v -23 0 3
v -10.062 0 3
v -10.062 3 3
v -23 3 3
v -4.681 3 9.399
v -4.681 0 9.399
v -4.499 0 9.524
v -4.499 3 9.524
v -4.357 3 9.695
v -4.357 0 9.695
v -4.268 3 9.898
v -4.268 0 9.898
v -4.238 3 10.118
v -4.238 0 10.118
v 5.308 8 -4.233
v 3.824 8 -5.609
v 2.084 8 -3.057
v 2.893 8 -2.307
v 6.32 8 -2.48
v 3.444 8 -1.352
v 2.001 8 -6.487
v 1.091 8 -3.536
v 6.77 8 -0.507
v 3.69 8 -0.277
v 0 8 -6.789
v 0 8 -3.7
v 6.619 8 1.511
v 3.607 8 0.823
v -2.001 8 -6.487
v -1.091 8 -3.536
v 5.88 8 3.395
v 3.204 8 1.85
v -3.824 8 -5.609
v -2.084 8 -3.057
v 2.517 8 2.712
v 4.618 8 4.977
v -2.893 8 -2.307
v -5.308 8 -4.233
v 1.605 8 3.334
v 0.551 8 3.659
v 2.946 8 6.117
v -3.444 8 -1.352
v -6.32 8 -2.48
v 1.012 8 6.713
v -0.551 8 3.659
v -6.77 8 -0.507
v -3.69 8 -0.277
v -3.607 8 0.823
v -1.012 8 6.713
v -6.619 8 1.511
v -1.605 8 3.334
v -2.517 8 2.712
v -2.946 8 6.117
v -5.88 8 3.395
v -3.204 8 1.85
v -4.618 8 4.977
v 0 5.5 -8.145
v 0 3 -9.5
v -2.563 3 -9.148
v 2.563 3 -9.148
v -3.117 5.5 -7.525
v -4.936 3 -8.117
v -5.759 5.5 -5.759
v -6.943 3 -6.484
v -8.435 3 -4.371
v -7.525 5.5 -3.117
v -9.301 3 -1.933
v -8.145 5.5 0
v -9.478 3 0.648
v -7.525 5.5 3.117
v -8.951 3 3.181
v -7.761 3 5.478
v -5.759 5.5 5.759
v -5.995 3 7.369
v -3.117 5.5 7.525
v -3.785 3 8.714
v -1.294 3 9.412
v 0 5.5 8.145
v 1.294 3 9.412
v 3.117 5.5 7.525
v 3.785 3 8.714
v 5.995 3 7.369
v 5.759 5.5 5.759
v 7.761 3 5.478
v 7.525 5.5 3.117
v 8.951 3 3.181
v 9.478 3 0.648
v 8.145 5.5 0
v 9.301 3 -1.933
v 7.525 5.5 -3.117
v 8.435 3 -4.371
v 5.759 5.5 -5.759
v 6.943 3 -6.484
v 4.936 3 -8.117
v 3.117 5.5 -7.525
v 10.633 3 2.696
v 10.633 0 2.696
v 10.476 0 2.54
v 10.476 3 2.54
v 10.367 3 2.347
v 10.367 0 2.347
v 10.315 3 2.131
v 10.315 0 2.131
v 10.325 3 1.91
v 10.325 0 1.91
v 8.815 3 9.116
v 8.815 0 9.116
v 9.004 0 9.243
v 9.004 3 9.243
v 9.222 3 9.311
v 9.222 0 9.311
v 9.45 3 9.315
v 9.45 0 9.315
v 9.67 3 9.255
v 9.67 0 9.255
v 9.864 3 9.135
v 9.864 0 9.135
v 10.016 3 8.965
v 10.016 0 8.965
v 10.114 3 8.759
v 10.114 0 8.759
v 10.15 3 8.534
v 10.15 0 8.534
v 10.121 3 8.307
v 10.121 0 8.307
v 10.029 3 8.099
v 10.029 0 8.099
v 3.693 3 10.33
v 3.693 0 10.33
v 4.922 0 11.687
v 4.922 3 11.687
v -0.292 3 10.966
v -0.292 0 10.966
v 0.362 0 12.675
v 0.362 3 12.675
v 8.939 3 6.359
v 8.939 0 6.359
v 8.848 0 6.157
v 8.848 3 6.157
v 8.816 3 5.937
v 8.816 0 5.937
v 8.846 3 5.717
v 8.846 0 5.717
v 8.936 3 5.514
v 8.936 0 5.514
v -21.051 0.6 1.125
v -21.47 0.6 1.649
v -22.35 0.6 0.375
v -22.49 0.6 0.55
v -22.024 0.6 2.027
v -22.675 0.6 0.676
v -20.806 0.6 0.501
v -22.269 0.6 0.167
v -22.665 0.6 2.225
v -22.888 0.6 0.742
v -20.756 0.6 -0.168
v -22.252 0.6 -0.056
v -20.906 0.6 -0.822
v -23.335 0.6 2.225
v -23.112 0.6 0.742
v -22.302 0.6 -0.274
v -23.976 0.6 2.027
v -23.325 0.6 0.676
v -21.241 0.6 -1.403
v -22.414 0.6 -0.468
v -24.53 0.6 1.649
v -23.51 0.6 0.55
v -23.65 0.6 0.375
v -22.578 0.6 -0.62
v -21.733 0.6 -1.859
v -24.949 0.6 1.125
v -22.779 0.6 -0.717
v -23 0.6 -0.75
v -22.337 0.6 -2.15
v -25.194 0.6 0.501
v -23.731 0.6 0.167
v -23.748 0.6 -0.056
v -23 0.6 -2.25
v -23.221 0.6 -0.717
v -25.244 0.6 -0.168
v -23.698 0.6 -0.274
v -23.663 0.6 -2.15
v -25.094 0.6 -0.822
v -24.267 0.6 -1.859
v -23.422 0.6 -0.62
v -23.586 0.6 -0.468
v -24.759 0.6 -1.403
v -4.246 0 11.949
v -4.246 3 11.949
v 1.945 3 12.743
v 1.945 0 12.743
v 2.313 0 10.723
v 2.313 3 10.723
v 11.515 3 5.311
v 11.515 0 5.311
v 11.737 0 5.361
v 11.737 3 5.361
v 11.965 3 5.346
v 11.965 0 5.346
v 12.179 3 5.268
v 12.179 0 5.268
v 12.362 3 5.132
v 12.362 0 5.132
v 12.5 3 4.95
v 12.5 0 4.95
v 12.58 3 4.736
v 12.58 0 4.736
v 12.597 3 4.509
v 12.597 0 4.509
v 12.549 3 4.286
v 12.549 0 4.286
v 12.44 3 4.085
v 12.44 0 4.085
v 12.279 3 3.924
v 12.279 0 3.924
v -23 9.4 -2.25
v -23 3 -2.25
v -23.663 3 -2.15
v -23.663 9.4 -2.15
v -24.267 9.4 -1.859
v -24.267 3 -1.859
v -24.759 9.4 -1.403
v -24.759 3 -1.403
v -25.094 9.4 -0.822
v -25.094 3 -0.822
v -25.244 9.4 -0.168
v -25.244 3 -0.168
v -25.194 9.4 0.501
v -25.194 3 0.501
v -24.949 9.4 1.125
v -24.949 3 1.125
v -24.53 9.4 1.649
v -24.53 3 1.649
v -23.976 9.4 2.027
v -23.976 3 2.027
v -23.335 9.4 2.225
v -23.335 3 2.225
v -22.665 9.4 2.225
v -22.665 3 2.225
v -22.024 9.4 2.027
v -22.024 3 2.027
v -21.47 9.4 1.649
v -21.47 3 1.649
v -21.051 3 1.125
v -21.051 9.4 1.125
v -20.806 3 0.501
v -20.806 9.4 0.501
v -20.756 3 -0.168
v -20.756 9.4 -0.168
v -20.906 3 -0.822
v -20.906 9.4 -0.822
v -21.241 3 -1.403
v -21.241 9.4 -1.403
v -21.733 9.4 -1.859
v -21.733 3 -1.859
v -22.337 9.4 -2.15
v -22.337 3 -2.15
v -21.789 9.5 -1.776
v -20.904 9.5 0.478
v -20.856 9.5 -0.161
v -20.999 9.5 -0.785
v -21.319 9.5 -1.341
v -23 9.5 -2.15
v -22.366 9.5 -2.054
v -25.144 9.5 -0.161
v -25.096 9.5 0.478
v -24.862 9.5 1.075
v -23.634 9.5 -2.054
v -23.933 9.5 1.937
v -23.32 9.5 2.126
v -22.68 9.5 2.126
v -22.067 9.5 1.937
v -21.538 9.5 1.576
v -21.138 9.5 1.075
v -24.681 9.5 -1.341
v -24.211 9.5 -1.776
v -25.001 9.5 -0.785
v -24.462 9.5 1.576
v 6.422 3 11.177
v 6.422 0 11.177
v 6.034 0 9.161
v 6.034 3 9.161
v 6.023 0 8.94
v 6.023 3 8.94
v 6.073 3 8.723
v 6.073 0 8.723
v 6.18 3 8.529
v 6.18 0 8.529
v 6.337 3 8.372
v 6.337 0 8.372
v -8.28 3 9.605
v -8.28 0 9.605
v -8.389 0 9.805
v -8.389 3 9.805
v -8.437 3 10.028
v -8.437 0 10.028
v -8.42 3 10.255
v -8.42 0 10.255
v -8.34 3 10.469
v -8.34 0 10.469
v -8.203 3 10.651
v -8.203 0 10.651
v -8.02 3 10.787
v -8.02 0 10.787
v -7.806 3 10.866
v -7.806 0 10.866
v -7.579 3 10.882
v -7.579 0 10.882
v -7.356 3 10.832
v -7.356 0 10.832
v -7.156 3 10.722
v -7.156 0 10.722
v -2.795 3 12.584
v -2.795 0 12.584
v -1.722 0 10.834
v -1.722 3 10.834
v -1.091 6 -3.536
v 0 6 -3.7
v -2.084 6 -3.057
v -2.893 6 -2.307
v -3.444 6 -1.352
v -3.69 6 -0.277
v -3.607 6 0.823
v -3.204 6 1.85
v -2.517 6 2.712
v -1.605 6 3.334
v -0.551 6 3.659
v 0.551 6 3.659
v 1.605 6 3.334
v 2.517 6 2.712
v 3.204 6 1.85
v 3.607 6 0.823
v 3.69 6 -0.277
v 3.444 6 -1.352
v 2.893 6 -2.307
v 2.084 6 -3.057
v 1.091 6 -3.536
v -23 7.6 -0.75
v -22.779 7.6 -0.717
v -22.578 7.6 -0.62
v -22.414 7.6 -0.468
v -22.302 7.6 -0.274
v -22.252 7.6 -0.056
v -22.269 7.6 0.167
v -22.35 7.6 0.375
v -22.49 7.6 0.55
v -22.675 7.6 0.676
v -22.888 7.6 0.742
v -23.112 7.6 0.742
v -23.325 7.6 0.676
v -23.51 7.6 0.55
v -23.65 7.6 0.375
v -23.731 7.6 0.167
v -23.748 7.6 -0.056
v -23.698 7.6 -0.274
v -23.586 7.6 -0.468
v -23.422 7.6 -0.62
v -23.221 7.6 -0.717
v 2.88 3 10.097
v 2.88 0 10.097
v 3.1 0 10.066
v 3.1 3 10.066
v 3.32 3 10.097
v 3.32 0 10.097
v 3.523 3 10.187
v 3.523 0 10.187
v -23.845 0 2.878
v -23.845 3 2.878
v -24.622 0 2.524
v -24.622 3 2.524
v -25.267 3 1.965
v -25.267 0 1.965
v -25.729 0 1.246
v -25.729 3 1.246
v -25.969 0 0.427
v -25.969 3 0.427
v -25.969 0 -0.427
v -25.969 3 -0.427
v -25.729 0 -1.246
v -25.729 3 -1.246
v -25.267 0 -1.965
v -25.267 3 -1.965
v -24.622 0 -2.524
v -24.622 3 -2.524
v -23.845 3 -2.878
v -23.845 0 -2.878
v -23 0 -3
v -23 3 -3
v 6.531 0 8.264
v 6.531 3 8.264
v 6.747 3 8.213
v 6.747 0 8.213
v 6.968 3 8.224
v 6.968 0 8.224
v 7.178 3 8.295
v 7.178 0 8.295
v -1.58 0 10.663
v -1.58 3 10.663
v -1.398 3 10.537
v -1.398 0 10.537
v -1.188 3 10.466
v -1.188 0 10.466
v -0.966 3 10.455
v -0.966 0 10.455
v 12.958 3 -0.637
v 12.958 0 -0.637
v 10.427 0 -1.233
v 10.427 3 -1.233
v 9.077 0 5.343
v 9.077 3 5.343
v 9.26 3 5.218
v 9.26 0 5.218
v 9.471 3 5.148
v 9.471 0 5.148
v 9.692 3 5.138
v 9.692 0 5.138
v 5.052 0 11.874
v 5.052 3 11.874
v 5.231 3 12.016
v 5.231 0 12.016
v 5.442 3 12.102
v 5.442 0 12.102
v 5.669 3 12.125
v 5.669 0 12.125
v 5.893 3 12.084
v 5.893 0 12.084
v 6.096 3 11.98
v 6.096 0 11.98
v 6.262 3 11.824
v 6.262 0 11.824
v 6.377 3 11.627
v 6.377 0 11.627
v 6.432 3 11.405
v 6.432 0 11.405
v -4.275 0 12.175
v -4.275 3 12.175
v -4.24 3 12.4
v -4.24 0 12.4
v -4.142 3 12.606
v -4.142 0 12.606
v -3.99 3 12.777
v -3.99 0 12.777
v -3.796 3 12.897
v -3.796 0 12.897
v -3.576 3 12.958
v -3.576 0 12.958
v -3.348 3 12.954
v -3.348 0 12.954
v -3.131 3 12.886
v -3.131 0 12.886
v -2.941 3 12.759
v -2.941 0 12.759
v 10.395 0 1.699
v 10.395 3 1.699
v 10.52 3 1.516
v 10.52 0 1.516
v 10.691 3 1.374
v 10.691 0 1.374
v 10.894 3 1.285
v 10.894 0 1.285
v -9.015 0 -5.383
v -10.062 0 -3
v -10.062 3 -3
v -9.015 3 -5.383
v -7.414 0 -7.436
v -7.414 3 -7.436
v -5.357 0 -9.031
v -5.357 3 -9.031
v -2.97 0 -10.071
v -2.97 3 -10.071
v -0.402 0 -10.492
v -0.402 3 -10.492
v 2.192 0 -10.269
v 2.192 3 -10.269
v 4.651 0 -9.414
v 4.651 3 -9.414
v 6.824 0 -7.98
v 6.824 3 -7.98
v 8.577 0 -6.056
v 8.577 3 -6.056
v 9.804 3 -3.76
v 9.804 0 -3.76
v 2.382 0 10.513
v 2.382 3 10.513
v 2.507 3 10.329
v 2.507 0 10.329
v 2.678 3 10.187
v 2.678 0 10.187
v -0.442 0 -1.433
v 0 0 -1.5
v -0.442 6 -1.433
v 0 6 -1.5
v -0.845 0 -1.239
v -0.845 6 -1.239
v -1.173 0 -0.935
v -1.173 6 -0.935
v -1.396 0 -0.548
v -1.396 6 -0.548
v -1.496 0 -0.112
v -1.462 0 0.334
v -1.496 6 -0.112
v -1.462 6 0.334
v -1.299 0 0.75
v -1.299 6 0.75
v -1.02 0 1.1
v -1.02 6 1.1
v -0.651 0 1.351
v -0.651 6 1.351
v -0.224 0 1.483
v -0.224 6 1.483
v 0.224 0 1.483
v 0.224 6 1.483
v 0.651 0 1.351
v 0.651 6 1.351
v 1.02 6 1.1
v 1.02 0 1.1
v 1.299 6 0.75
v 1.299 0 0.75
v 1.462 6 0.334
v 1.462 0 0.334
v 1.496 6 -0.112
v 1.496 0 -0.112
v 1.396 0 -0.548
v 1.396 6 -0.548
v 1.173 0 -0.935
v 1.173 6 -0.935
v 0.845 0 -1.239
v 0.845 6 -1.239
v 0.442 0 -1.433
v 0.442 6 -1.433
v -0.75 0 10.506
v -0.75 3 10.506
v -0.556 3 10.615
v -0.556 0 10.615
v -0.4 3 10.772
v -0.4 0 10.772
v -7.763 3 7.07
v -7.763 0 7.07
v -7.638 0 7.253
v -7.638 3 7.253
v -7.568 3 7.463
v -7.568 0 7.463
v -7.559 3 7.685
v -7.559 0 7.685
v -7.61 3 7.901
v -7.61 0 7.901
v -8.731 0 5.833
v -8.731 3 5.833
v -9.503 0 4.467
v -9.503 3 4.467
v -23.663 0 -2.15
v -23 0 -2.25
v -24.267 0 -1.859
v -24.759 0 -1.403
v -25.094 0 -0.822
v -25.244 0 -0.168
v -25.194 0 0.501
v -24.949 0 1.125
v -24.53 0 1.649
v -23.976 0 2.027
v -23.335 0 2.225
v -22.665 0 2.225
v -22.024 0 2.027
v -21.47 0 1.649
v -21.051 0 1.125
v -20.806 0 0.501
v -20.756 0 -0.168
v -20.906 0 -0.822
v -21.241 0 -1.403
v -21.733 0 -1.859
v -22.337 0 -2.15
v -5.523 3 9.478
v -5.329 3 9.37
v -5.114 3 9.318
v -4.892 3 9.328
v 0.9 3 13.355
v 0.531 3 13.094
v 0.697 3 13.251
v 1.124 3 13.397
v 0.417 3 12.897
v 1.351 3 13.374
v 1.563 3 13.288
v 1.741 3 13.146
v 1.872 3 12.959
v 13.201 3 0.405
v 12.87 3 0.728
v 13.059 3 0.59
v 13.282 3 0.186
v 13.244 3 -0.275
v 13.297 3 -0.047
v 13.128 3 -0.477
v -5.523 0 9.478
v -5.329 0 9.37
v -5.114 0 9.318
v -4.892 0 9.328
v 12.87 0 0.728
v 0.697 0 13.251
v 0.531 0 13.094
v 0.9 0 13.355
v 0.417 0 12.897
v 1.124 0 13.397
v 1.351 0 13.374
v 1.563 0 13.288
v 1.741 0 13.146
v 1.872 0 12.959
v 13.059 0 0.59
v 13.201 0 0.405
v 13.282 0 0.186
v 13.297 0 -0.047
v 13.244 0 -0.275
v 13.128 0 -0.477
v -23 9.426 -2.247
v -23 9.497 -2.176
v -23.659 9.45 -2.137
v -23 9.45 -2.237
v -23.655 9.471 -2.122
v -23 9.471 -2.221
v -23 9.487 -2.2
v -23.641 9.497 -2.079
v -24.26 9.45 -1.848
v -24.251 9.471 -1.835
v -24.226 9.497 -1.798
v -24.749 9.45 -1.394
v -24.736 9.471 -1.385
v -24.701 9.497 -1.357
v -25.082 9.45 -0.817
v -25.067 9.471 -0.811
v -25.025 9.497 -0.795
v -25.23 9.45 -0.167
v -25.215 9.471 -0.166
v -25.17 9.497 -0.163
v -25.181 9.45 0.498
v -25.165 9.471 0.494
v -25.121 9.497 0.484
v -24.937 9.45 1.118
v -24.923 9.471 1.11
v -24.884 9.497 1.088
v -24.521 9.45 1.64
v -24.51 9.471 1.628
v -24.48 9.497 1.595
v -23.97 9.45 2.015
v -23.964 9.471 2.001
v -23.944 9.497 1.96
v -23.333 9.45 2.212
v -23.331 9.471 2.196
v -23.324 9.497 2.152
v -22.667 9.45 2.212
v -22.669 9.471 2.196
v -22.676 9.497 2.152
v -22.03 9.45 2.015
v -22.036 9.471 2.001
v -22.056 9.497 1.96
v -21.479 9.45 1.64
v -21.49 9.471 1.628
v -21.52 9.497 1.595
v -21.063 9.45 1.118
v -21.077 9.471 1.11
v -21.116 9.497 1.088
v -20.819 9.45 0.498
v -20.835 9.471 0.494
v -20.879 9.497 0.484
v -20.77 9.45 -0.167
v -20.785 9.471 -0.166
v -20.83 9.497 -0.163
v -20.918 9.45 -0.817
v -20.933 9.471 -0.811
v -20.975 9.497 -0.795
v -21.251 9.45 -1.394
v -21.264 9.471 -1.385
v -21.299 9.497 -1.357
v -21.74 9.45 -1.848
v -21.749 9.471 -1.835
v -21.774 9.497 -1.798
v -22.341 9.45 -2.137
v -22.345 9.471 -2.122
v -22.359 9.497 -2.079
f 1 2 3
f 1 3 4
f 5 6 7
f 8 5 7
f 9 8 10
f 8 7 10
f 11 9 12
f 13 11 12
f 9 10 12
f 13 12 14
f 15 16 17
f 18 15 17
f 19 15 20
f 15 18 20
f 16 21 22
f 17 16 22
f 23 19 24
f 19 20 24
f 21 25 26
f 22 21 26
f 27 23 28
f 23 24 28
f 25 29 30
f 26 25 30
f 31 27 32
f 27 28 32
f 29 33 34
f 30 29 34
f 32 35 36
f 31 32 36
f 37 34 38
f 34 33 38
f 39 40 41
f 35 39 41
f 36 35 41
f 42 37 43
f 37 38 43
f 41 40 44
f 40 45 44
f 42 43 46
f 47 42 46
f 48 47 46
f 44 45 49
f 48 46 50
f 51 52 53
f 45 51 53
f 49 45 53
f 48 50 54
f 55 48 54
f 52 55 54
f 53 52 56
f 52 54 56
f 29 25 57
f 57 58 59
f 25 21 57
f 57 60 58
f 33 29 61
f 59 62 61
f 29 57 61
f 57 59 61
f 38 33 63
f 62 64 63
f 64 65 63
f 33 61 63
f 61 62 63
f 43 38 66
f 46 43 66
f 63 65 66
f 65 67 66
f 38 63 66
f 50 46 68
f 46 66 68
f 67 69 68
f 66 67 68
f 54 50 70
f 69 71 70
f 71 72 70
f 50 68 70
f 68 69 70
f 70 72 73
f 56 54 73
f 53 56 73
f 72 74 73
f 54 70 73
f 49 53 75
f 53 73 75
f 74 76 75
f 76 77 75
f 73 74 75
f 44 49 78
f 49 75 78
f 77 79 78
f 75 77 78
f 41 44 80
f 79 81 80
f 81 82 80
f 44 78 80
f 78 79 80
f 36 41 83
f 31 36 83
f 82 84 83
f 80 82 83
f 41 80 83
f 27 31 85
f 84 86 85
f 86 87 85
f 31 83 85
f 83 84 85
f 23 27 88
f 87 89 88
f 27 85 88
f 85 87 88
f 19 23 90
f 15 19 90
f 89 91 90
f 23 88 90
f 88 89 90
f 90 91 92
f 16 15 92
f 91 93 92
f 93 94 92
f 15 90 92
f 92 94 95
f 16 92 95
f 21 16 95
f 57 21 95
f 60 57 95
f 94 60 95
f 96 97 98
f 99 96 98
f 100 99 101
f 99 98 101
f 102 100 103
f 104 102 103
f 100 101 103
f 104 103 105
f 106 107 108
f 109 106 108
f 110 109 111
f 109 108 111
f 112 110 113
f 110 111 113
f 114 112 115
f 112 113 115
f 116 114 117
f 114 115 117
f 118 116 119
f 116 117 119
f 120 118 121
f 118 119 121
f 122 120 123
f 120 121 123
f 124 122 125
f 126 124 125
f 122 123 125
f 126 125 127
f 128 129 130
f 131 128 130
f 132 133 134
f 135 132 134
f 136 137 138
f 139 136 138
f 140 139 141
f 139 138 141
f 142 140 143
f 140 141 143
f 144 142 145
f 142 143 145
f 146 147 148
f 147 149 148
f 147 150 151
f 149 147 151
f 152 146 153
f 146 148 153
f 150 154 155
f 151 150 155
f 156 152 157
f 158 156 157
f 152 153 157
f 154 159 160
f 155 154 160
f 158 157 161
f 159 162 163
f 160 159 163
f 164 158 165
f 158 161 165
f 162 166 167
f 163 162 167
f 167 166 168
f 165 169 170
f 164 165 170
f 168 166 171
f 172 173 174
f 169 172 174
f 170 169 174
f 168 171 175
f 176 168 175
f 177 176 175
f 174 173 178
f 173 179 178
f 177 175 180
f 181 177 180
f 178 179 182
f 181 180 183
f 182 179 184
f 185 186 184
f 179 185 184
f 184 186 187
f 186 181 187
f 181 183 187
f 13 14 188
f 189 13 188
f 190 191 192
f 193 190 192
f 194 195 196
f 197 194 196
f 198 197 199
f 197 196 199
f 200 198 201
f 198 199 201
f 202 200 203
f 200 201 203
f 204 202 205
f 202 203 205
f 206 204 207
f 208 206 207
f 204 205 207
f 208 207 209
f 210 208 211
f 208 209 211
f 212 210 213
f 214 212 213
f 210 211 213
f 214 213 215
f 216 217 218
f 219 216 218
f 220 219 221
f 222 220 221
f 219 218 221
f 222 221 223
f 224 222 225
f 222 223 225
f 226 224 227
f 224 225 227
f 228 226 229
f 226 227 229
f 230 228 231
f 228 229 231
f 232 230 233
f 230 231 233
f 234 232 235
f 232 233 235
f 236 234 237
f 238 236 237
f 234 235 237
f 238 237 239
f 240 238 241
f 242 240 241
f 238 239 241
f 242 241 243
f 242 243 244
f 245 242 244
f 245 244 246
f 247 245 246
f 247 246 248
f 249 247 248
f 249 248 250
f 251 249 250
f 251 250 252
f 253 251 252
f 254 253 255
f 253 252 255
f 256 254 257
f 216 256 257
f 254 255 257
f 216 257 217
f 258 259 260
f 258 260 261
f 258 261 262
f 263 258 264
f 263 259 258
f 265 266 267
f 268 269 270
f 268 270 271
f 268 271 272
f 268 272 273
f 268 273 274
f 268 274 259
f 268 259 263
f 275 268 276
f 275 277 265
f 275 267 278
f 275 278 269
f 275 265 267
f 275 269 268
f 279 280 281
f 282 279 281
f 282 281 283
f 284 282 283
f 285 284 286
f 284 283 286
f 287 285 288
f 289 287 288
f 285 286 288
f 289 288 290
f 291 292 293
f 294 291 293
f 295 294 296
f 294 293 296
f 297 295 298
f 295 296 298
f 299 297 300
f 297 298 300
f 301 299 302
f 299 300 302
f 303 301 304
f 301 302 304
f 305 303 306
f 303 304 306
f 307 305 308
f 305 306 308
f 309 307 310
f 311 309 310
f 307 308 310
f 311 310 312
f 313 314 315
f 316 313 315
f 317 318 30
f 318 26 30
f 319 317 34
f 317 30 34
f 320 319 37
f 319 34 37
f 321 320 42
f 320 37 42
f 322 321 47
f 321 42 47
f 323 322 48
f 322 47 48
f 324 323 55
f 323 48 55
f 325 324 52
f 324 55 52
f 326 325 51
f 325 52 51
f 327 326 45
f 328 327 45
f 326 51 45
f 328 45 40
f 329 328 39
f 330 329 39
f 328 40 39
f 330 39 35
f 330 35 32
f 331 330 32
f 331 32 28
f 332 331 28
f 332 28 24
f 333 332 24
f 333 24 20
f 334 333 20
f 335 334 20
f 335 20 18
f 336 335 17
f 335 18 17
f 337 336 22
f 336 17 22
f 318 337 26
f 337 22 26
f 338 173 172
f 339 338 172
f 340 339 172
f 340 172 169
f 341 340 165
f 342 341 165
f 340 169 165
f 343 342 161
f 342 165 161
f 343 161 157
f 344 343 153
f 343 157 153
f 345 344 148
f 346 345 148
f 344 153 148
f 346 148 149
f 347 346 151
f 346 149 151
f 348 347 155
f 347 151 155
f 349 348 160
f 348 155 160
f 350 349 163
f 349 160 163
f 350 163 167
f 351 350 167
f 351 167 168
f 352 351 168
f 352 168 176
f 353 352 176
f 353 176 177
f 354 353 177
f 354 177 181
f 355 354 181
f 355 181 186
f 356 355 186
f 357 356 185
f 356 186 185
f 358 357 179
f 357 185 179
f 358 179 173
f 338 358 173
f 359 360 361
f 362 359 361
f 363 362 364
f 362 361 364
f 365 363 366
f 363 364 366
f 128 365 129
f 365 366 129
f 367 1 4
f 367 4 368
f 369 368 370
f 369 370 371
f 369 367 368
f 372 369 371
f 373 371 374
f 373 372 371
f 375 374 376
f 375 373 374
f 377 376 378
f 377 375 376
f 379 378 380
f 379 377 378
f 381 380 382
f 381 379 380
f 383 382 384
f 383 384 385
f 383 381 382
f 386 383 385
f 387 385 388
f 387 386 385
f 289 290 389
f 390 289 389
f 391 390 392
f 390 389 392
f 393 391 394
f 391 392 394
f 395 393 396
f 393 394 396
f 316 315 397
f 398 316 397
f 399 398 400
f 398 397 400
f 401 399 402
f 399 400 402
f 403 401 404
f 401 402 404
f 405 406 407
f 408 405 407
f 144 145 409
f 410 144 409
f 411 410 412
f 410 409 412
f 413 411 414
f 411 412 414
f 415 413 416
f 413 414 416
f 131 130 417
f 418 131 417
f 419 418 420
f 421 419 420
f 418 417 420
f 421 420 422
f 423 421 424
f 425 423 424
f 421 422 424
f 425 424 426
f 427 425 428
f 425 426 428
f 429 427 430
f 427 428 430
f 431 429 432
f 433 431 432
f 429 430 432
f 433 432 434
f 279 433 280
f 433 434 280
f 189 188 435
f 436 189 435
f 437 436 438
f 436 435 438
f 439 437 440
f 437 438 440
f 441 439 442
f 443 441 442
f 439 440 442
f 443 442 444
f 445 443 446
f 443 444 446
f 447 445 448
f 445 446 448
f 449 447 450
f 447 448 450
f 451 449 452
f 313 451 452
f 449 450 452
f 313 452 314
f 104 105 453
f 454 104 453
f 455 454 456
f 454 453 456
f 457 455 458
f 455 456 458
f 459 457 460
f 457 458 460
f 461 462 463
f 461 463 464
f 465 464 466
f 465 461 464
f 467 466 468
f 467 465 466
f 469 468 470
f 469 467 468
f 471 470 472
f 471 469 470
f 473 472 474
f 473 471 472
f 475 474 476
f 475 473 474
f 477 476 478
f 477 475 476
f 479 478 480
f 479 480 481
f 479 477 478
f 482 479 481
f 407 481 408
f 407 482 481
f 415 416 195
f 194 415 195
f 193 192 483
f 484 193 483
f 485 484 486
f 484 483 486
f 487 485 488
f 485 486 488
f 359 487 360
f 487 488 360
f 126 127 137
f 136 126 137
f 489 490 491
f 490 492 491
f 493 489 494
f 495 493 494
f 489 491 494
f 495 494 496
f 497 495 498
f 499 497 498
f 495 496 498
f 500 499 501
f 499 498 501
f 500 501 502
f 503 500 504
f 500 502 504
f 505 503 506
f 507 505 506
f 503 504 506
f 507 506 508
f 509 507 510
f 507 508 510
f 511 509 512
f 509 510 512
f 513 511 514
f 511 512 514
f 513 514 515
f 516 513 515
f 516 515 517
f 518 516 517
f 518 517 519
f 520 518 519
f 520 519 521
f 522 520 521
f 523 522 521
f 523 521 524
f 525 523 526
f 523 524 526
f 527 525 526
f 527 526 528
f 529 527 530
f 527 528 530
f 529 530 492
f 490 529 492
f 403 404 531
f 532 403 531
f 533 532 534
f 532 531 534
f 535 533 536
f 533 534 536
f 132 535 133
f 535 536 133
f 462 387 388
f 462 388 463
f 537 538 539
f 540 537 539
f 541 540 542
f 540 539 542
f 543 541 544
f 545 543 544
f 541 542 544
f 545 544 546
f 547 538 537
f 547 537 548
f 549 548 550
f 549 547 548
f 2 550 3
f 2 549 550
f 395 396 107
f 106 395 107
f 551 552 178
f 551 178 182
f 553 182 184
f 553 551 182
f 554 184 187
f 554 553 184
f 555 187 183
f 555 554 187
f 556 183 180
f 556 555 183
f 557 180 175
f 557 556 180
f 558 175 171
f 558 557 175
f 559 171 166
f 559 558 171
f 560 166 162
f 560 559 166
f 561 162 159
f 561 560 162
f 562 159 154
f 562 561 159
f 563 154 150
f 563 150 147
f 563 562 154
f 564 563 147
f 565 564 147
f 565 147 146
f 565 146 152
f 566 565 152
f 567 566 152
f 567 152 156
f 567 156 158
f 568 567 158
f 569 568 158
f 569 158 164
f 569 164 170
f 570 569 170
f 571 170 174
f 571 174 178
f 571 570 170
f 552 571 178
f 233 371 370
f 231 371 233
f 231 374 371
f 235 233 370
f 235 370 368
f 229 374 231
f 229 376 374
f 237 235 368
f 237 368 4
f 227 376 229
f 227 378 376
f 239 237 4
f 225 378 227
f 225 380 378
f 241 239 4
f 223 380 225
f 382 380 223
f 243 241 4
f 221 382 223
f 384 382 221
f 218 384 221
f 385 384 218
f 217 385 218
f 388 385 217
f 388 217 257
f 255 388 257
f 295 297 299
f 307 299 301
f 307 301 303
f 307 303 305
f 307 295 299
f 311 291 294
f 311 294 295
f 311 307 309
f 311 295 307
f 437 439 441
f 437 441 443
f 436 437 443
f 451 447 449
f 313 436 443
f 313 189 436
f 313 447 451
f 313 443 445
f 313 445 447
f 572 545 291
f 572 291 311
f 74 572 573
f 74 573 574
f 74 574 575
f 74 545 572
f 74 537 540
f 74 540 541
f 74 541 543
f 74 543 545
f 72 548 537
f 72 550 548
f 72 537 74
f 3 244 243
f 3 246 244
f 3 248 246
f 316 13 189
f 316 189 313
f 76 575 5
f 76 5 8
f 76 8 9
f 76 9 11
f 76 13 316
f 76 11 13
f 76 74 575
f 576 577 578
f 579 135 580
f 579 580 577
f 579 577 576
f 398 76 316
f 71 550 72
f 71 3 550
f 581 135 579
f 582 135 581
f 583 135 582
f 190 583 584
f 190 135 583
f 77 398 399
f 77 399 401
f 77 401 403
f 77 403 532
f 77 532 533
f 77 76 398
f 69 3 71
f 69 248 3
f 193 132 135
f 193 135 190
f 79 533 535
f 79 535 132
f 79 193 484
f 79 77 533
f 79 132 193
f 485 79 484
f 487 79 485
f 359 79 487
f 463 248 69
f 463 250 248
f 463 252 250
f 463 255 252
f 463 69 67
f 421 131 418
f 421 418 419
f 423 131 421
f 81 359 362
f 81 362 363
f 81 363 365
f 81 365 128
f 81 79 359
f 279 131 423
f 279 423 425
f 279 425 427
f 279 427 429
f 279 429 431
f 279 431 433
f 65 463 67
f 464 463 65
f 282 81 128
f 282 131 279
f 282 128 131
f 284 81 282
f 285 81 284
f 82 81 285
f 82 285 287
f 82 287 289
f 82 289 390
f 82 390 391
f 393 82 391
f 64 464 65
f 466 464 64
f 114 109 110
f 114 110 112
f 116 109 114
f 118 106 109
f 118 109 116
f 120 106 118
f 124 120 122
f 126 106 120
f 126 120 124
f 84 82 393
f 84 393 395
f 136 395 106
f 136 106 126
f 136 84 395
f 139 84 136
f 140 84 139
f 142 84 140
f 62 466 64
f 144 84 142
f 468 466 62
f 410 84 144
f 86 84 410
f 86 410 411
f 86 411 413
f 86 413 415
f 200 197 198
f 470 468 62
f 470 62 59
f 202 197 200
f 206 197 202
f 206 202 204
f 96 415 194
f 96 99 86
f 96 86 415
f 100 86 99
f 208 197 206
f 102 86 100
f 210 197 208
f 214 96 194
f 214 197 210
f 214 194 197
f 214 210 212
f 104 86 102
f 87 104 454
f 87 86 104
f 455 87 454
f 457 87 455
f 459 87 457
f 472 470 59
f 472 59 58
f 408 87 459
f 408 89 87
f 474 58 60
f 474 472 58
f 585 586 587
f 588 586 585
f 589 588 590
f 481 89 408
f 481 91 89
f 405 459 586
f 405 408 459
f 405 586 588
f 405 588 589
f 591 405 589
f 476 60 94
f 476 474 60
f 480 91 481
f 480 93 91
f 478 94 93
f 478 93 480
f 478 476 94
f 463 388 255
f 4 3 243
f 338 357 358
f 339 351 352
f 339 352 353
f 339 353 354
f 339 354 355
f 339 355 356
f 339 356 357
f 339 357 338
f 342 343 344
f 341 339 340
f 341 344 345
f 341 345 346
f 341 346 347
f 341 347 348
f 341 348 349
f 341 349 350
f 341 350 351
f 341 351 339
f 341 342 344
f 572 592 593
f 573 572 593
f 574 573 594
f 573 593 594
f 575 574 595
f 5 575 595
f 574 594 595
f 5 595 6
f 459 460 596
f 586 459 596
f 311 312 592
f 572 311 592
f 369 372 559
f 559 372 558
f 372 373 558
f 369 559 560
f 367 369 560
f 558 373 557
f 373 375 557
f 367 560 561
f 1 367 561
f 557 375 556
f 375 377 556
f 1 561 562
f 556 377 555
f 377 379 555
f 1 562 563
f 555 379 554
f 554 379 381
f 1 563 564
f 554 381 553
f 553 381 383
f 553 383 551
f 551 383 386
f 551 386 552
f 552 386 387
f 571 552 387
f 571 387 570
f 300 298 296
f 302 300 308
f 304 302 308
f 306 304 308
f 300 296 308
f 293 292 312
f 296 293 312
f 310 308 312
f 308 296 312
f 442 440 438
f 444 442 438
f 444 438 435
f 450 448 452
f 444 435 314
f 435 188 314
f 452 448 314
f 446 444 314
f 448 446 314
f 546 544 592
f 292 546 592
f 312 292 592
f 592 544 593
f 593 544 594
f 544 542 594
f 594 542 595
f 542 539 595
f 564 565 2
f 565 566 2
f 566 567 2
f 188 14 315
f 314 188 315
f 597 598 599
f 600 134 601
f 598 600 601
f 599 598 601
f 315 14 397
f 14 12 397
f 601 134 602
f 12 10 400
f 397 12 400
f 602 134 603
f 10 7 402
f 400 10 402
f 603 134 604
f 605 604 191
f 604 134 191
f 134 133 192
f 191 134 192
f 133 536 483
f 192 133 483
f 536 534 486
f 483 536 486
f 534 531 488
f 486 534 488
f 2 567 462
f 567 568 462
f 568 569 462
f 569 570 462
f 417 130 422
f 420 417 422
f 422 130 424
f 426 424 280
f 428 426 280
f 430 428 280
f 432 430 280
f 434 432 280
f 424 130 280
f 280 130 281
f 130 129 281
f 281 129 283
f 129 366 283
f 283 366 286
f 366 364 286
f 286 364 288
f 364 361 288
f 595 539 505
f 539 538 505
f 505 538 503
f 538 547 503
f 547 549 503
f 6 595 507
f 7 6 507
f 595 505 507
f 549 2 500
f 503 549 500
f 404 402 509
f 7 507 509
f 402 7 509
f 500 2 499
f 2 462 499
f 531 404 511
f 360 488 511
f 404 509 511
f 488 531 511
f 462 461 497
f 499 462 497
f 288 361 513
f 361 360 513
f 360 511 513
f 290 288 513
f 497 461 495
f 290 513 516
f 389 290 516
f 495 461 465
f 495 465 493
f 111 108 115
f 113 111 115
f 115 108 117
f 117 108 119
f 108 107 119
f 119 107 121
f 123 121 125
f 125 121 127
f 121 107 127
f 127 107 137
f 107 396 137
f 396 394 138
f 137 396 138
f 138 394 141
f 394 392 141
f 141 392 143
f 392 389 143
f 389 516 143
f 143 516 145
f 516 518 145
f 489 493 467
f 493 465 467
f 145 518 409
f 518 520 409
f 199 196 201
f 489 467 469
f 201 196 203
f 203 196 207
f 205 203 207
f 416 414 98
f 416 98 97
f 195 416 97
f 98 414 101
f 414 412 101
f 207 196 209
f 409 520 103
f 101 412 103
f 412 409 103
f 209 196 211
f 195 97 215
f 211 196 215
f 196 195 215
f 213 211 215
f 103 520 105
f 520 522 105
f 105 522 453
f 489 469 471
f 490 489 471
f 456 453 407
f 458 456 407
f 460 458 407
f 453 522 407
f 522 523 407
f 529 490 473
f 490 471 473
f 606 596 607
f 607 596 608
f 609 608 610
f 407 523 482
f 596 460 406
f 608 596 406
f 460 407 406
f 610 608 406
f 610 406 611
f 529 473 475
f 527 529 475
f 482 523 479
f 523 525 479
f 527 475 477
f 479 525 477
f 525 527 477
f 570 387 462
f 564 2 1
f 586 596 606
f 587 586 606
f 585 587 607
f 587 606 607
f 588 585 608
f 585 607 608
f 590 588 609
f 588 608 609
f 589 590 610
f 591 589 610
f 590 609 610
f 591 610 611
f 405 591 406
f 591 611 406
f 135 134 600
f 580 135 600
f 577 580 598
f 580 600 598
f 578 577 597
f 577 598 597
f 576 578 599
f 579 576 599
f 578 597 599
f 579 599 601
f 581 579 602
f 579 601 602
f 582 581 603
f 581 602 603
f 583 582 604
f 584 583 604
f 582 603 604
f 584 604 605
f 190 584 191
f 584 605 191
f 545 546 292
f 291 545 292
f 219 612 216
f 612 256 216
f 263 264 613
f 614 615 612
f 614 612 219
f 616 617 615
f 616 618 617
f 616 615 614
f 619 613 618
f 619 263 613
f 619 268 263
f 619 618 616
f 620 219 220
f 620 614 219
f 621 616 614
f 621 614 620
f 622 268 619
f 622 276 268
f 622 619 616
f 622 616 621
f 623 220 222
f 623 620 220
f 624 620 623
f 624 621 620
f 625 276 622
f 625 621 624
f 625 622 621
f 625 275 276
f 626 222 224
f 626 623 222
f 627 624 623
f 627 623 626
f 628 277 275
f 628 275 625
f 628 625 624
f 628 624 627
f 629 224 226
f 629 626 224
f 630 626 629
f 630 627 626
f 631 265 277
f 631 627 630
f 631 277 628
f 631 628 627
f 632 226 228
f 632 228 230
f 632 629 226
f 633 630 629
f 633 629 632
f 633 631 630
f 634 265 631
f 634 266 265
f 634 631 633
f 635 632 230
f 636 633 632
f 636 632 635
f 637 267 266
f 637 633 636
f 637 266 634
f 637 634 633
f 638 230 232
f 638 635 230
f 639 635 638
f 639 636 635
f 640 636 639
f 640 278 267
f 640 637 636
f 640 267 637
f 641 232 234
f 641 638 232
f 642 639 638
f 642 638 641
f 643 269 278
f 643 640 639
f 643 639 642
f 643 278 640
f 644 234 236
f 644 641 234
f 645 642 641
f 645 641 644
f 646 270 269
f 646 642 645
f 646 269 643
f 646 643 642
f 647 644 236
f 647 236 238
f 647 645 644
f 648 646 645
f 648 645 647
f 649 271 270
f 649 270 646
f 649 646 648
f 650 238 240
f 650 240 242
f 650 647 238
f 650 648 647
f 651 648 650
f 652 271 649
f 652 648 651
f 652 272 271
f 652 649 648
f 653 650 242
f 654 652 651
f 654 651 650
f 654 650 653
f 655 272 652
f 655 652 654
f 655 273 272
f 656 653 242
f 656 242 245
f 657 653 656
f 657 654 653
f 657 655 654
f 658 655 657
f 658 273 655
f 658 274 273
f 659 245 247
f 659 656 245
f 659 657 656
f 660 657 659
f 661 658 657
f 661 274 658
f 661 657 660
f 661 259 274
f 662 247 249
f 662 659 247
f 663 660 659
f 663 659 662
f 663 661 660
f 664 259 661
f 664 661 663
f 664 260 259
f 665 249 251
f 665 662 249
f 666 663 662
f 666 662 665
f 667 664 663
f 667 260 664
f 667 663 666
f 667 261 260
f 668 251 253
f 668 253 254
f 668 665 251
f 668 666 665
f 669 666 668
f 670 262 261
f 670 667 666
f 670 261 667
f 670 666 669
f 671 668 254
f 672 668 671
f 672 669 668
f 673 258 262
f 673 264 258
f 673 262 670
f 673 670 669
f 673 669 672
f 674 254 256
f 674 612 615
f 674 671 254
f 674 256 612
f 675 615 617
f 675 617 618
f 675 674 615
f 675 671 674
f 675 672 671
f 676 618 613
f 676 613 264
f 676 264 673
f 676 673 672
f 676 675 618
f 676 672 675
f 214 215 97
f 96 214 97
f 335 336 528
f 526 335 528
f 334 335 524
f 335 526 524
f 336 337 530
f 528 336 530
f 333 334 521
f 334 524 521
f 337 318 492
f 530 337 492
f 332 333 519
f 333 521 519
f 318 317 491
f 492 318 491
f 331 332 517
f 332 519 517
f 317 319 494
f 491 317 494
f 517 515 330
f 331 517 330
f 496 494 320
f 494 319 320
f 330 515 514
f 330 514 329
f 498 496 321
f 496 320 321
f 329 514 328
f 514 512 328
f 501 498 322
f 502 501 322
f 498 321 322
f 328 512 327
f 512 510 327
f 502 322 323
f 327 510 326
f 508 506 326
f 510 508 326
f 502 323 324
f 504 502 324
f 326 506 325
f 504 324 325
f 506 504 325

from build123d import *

# Parameters (mm, degrees)
BOSS_EXTRUDE1_DEPTH = 3
BOSS_EXTRUDE2_DEPTH = 3
SKETCH3_R           = 2.25
BOSS_EXTRUDE3_DEPTH = 6.5
FILLET1_R           = 0.1
SKETCH6_R           = 1.5
CUT_EXTRUDE3_DEPTH  = 30.962406787
SKETCH7_R           = 2.25
CUT_EXTRUDE4_DEPTH  = 0.6
SKETCH8_R           = 0.75
CUT_EXTRUDE5_DEPTH  = 7


# Read off the part's stored shape, not the designer's step: Boss-Extrude2
with BuildPart() as part:
    # Sketch1 → Boss-Extrude1 (new body)
    with BuildSketch(Plane(origin=(0, 0, 0), x_dir=(1, 0, 0), z_dir=(0, 1, 0))):
        with BuildLine():
            Line((-23, 3), (-10.062305899, 3))
            ThreePointArc((-10.062305899, 3), (10.5, 0), (-10.062305899, -3))
            Line((-10.062305899, -3), (-23, -3))
            ThreePointArc((-23, -3), (-26, 0), (-23, 3))
        make_face()
    extrude(amount=BOSS_EXTRUDE1_DEPTH)

    # Boss-Extrude2 outline → Boss-Extrude2 (add)
    with BuildSketch(Plane(origin=(0, 0, 0), x_dir=(1, 0, 0), z_dir=(0, 1, 0))):
        with BuildLine():
            ThreePointArc((-5.522818211, -9.478178454), (-5.113524662, -9.318232563), (-4.681499231, -9.398593775))
            ThreePointArc((-4.681499231, -9.398593775), (-6.330495099, -8.377041948), (-7.763435591, -7.069587529))
            ThreePointArc((-7.763435591, -7.069587529), (-7.568178787, -7.463260843), (-7.61030601, -7.900672771))
            Line((-7.61030601, -7.900672771), (-8.279523298, -9.604618361))
            ThreePointArc((-8.279523298, -9.604618361), (-8.203196552, -10.651208986), (-7.156206429, -10.721844617))
            Line((-7.156206429, -10.721844617), (-5.522818211, -9.478178454))
        make_face()
        with BuildLine():
            ThreePointArc((-1.721512659, -10.833918126), (-1.397763446, -10.536788435), (-0.965920838, -10.455476887))
            ThreePointArc((-0.965920838, -10.455476887), (-2.872731946, -10.099376771), (-4.681499231, -9.398593775))
            ThreePointArc((-4.681499231, -9.398593775), (-4.357094721, -9.695015118), (-4.238192033, -10.118058909))
            Line((-4.238192033, -10.118058909), (-4.245930648, -11.948693352))
            ThreePointArc((-4.245930648, -11.948693352), (-3.796296521, -12.896853076), (-2.79461913, -12.584091002))
            Line((-2.79461913, -12.584091002), (-1.721512659, -10.833918126))
        make_face()
        with BuildLine():
            ThreePointArc((2.312803759, -10.723261005), (2.507193937, -10.329163724), (2.880407716, -10.097190272))
            ThreePointArc((2.880407716, -10.097190272), (0.973862068, -10.454740201), (-0.965920838, -10.455476887))
            ThreePointArc((-0.965920838, -10.455476887), (-0.556271486, -10.614522786), (-0.292428604, -10.965941515))
            Line((-0.292428604, -10.965941515), (0.362358895, -12.675484051))
            ThreePointArc((0.362358895, -12.675484051), (1.124441346, -13.396877181), (1.945226568, -12.7430505))
            Line((1.945226568, -12.7430505), (2.312803759, -10.723261005))
        make_face()
        with BuildLine():
            ThreePointArc((6.034076643, -9.161184796), (6.072796451, -8.723461012), (6.336866889, -8.372223004))
            ThreePointArc((6.336866889, -8.372223004), (4.688647545, -9.39502976), (2.880407716, -10.097190272))
            ThreePointArc((2.880407716, -10.097190272), (3.319847778, -10.097333864), (3.692915739, -10.329557645))
            Line((3.692915739, -10.329557645), (4.921602293, -11.686617593))
            ThreePointArc((4.921602293, -11.686617593), (5.892983381, -12.083601839), (6.421781187, -11.177207559))
            Line((6.421781187, -11.177207559), (6.034076643, -9.161184796))
        make_face()
        with BuildLine():
            ThreePointArc((8.938622786, -6.359120261), (8.816430498, -5.937014916), (8.935616531, -5.514050889))
            ThreePointArc((8.935616531, -5.514050889), (7.768814222, -7.063676492), (6.336866889, -8.372223004))
            ThreePointArc((6.336866889, -8.372223004), (6.746618445, -8.213446044), (7.178415082, -8.295043382))
            Line((7.178415082, -8.295043382), (8.814695021, -9.115939424))
            ThreePointArc((8.814695021, -9.115939424), (9.863895986, -9.134782017), (10.029132325, -8.098502778))
            Line((10.029132325, -8.098502778), (8.938622786, -6.359120261))
        make_face()
        with BuildLine():
            ThreePointArc((10.633304904, -2.696333552), (10.366740607, -2.346987899), (10.324902114, -1.909553962))
            ThreePointArc((10.324902114, -1.909553962), (9.797448349, -3.776242293), (8.935616531, -5.514050889))
            ThreePointArc((8.935616531, -5.514050889), (9.260219543, -5.217846902), (9.692298733, -5.13777511))
            Line((9.692298733, -5.13777511), (11.514697643, -5.311396998))
            ThreePointArc((11.514697643, -5.311396998), (12.499706621, -4.949547548), (12.279016357, -3.923646229))
            Line((12.279016357, -3.923646229), (10.633304904, -2.696333552))
        make_face()
        with BuildLine():
            Line((12.95822192, 0.637416485), (10.427354789, 1.23299315))
            ThreePointArc((10.427354789, 1.23299315), (10.49442434, -0.342137064), (10.324902114, -1.909553962))
            ThreePointArc((10.324902114, -1.909553962), (10.520420766, -1.516004291), (10.894306512, -1.285096658))
            Line((10.894306512, -1.285096658), (12.870116963, -0.727570251))
            ThreePointArc((12.870116963, -0.727570251), (13.298325237, -0.06987275), (12.95822192, 0.637416485))
        make_face()
    extrude(amount=BOSS_EXTRUDE2_DEPTH)

    # Sketch5 → Revolve1 (revolve)
    with BuildSketch(Plane.XY, mode=Mode.PRIVATE) as revolve1_sk:
        Polygon((-3.7, 8), (-6.789097331, 8), (-9.5, 3), (-1.5, 3), (-1.5, 6), (-3.7, 6), align=None)
    revolve(revolve1_sk.sketch.rotate(Axis((0, 0, 0), (0, 1, 0)), 270), axis=Axis((0, 0, 0), (0, 1, 0)))

    # Sketch3 → Boss-Extrude3 (add)
    with BuildSketch(Plane(origin=(0, 3, 0), x_dir=(1, 0, 0), z_dir=(0, 1, 0))):
        with Locations(Location((-23, 0, 0), (0, 0, 90))):
            Circle(SKETCH3_R)
    extrude(amount=BOSS_EXTRUDE3_DEPTH)

    # Fillet1
    fillet1_edges = [part.edges().sort_by_distance(p)[0] for p in [
        (-23, 9.5, 2.25),
    ]]
    fillet(fillet1_edges, radius=FILLET1_R)

    # Sketch6 → Cut-Extrude3 (cut, through all)
    with BuildSketch(Plane(origin=(0, 3, 0), x_dir=(1, 0, 0), z_dir=(0, 1, 0))):
        with Locations(Location((0, 0, 0), (0, 0, 90))):
            Circle(SKETCH6_R)
    extrude(amount=-CUT_EXTRUDE3_DEPTH, mode=Mode.SUBTRACT)

    # Sketch7 → Cut-Extrude4 (cut)
    with BuildSketch(Plane(origin=(0, 0, 0), x_dir=(1, 0, 0), z_dir=(0, 1, 0))):
        with Locations(Location((-23, 0, 0), (0, 0, 90))):
            Circle(SKETCH7_R)
    extrude(amount=CUT_EXTRUDE4_DEPTH, mode=Mode.SUBTRACT)

    # Sketch8 → Cut-Extrude5 (cut)
    with BuildSketch(Plane.XZ.offset(-0.6)):
        with Locations(Location((-23, 0, 0), (0, 0, 270))):
            Circle(SKETCH8_R)
    extrude(amount=-CUT_EXTRUDE5_DEPTH, mode=Mode.SUBTRACT)


solid = part.part
